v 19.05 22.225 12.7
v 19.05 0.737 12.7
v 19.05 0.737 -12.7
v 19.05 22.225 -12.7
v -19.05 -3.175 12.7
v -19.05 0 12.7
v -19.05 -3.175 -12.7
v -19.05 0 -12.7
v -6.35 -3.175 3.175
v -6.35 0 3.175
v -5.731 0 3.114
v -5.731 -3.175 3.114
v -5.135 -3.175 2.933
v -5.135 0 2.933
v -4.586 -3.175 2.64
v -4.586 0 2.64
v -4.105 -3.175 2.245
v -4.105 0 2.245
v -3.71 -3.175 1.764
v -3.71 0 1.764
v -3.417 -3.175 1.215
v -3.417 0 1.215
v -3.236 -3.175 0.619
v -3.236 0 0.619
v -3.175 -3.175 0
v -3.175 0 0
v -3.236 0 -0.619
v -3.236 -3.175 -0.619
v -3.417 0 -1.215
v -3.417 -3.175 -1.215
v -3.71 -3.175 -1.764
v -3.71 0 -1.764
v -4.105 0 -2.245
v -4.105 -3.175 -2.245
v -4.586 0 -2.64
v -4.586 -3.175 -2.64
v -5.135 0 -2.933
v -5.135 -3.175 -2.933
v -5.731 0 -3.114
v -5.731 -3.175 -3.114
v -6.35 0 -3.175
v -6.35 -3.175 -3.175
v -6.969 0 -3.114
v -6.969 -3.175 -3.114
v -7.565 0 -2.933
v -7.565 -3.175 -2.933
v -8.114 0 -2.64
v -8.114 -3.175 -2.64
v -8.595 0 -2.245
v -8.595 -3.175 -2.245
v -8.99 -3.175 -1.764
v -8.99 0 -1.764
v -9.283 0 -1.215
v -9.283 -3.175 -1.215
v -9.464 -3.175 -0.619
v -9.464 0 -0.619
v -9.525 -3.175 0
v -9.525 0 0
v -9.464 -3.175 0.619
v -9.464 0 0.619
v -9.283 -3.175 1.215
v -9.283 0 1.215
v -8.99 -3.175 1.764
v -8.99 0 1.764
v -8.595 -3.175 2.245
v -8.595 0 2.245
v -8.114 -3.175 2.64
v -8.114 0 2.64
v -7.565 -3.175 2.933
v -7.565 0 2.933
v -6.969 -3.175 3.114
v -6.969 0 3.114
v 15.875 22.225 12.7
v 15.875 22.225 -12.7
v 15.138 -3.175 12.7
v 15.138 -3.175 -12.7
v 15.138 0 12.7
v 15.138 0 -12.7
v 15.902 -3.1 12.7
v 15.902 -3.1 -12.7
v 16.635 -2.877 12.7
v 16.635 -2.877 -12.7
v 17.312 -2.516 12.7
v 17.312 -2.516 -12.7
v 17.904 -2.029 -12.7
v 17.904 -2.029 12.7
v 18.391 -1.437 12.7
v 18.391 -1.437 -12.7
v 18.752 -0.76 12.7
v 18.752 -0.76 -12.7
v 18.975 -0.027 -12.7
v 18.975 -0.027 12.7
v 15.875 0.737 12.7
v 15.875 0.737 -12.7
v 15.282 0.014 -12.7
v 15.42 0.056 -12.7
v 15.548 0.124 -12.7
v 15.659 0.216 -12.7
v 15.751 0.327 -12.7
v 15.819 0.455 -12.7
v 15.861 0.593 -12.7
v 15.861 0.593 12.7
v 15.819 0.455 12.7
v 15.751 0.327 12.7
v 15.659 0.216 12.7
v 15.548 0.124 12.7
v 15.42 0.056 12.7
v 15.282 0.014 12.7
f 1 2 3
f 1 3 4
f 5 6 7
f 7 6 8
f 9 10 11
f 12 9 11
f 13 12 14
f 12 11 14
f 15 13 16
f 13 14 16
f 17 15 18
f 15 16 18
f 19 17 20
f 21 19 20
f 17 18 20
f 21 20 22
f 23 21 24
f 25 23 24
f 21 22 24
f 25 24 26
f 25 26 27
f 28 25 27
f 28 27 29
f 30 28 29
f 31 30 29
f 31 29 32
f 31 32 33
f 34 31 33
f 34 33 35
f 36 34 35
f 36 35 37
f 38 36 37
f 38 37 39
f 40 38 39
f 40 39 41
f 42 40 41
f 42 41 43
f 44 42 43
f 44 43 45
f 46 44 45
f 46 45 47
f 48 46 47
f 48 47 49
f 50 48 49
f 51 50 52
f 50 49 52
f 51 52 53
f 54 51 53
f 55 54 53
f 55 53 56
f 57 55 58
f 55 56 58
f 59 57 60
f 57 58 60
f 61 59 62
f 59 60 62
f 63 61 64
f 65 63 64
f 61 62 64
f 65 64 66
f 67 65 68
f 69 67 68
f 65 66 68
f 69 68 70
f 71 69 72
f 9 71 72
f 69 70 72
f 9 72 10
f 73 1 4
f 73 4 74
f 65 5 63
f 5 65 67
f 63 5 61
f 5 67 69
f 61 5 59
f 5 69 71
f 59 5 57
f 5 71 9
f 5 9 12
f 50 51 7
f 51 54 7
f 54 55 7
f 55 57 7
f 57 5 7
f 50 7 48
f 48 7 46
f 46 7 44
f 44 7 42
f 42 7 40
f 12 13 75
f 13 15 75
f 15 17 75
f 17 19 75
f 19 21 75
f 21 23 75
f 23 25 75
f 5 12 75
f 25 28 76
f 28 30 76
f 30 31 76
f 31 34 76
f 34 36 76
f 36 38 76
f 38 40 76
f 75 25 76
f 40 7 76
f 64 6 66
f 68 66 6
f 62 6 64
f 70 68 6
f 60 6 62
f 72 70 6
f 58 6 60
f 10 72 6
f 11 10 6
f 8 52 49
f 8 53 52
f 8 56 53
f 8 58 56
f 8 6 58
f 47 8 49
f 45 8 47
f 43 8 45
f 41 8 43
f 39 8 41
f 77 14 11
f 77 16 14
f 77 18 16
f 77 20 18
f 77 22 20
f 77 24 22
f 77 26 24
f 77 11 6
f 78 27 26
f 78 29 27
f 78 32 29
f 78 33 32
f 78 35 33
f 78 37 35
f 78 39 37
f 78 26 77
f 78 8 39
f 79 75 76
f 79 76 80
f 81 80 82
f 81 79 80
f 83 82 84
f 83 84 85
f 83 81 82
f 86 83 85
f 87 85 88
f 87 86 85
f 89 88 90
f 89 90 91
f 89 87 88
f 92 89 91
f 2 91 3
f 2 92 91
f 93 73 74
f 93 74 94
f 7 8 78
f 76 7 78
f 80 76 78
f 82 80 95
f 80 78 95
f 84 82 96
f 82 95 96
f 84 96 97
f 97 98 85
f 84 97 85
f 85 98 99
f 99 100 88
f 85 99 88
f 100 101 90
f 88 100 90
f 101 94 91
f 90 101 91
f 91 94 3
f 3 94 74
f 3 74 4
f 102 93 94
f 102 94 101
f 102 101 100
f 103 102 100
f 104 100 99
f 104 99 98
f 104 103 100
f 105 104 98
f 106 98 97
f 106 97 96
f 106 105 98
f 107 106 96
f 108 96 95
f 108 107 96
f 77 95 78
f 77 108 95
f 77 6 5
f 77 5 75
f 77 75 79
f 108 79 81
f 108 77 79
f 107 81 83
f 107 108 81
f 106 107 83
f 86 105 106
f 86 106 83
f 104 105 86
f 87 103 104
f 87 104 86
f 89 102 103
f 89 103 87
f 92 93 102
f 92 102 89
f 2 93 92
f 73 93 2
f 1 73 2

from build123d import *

# Parameters (mm, degrees)
SKETCH1_W                    = 38.1
SKETCH1_H                    = 25.4
BASE_FLANGE1_DEPTH           = 3.175
EDGE_FLANGE1_STRIP_W         = 14.1732
EDGE_FLANGE1_STRIP_H         = 3.175
EDGE_FLANGE1_STRIP_CUT_DEPTH = 25.4
EDGE_FLANGE1_DEPTH           = 25.4
SKETCH10_R                   = 3.175
CUT_EXTRUDE1_DEPTH           = 32.908355097


# Sheet-metal steps are written as plain solids
with BuildPart() as part:
    # Sketch1 → Base-Flange1 (new body)
    with BuildSketch(Plane(origin=(0, 0, 0), x_dir=(1, 0, 0), z_dir=(0, 1, 0))):
        Rectangle(SKETCH1_W, SKETCH1_H)
    extrude(amount=-BASE_FLANGE1_DEPTH)

    # Edge-Flange1 strip (across the edge) → Edge-Flange1 strip cut (cut)
    with BuildSketch(Plane(origin=(19.05, 0, 12.7), x_dir=(-1, 0, 0), z_dir=(0, 0, -1))):
        with Locations((-3.175, -1.5875)):
            Rectangle(EDGE_FLANGE1_STRIP_W, EDGE_FLANGE1_STRIP_H)
    extrude(amount=EDGE_FLANGE1_STRIP_CUT_DEPTH, mode=Mode.SUBTRACT)

    # Edge-Flange1 section (across the edge) → Edge-Flange1 (add)
    with BuildSketch(Plane(origin=(19.05, 0, 12.7), x_dir=(-1, 0, 0), z_dir=(0, 0, -1))):
        with BuildLine():
            Line((0, 0.7366), (0, 22.225))
            Line((0, 22.225), (3.175, 22.225))
            Line((3.175, 22.225), (3.175, 0.7366))
            ThreePointArc((3.175, 0.7366), (3.390745145, 0.215745145), (3.9116, 0))
            Line((3.9116, 0), (3.9116, -3.175))
            ThreePointArc((3.9116, -3.175), (1.145681115, -2.029318885), (0, 0.7366))
        make_face()
    extrude(amount=EDGE_FLANGE1_DEPTH)

    # Sketch10 → Cut-Extrude1 (cut, through all)
    with BuildSketch(Plane(origin=(0, 0, 0), x_dir=(1, 0, 0), z_dir=(0, 1, 0))):
        with Locations(Location((-6.35, 0, 0), (0, 0, 270))):
            Circle(SKETCH10_R)
    extrude(amount=-CUT_EXTRUDE1_DEPTH, mode=Mode.SUBTRACT)


solid = part.part
